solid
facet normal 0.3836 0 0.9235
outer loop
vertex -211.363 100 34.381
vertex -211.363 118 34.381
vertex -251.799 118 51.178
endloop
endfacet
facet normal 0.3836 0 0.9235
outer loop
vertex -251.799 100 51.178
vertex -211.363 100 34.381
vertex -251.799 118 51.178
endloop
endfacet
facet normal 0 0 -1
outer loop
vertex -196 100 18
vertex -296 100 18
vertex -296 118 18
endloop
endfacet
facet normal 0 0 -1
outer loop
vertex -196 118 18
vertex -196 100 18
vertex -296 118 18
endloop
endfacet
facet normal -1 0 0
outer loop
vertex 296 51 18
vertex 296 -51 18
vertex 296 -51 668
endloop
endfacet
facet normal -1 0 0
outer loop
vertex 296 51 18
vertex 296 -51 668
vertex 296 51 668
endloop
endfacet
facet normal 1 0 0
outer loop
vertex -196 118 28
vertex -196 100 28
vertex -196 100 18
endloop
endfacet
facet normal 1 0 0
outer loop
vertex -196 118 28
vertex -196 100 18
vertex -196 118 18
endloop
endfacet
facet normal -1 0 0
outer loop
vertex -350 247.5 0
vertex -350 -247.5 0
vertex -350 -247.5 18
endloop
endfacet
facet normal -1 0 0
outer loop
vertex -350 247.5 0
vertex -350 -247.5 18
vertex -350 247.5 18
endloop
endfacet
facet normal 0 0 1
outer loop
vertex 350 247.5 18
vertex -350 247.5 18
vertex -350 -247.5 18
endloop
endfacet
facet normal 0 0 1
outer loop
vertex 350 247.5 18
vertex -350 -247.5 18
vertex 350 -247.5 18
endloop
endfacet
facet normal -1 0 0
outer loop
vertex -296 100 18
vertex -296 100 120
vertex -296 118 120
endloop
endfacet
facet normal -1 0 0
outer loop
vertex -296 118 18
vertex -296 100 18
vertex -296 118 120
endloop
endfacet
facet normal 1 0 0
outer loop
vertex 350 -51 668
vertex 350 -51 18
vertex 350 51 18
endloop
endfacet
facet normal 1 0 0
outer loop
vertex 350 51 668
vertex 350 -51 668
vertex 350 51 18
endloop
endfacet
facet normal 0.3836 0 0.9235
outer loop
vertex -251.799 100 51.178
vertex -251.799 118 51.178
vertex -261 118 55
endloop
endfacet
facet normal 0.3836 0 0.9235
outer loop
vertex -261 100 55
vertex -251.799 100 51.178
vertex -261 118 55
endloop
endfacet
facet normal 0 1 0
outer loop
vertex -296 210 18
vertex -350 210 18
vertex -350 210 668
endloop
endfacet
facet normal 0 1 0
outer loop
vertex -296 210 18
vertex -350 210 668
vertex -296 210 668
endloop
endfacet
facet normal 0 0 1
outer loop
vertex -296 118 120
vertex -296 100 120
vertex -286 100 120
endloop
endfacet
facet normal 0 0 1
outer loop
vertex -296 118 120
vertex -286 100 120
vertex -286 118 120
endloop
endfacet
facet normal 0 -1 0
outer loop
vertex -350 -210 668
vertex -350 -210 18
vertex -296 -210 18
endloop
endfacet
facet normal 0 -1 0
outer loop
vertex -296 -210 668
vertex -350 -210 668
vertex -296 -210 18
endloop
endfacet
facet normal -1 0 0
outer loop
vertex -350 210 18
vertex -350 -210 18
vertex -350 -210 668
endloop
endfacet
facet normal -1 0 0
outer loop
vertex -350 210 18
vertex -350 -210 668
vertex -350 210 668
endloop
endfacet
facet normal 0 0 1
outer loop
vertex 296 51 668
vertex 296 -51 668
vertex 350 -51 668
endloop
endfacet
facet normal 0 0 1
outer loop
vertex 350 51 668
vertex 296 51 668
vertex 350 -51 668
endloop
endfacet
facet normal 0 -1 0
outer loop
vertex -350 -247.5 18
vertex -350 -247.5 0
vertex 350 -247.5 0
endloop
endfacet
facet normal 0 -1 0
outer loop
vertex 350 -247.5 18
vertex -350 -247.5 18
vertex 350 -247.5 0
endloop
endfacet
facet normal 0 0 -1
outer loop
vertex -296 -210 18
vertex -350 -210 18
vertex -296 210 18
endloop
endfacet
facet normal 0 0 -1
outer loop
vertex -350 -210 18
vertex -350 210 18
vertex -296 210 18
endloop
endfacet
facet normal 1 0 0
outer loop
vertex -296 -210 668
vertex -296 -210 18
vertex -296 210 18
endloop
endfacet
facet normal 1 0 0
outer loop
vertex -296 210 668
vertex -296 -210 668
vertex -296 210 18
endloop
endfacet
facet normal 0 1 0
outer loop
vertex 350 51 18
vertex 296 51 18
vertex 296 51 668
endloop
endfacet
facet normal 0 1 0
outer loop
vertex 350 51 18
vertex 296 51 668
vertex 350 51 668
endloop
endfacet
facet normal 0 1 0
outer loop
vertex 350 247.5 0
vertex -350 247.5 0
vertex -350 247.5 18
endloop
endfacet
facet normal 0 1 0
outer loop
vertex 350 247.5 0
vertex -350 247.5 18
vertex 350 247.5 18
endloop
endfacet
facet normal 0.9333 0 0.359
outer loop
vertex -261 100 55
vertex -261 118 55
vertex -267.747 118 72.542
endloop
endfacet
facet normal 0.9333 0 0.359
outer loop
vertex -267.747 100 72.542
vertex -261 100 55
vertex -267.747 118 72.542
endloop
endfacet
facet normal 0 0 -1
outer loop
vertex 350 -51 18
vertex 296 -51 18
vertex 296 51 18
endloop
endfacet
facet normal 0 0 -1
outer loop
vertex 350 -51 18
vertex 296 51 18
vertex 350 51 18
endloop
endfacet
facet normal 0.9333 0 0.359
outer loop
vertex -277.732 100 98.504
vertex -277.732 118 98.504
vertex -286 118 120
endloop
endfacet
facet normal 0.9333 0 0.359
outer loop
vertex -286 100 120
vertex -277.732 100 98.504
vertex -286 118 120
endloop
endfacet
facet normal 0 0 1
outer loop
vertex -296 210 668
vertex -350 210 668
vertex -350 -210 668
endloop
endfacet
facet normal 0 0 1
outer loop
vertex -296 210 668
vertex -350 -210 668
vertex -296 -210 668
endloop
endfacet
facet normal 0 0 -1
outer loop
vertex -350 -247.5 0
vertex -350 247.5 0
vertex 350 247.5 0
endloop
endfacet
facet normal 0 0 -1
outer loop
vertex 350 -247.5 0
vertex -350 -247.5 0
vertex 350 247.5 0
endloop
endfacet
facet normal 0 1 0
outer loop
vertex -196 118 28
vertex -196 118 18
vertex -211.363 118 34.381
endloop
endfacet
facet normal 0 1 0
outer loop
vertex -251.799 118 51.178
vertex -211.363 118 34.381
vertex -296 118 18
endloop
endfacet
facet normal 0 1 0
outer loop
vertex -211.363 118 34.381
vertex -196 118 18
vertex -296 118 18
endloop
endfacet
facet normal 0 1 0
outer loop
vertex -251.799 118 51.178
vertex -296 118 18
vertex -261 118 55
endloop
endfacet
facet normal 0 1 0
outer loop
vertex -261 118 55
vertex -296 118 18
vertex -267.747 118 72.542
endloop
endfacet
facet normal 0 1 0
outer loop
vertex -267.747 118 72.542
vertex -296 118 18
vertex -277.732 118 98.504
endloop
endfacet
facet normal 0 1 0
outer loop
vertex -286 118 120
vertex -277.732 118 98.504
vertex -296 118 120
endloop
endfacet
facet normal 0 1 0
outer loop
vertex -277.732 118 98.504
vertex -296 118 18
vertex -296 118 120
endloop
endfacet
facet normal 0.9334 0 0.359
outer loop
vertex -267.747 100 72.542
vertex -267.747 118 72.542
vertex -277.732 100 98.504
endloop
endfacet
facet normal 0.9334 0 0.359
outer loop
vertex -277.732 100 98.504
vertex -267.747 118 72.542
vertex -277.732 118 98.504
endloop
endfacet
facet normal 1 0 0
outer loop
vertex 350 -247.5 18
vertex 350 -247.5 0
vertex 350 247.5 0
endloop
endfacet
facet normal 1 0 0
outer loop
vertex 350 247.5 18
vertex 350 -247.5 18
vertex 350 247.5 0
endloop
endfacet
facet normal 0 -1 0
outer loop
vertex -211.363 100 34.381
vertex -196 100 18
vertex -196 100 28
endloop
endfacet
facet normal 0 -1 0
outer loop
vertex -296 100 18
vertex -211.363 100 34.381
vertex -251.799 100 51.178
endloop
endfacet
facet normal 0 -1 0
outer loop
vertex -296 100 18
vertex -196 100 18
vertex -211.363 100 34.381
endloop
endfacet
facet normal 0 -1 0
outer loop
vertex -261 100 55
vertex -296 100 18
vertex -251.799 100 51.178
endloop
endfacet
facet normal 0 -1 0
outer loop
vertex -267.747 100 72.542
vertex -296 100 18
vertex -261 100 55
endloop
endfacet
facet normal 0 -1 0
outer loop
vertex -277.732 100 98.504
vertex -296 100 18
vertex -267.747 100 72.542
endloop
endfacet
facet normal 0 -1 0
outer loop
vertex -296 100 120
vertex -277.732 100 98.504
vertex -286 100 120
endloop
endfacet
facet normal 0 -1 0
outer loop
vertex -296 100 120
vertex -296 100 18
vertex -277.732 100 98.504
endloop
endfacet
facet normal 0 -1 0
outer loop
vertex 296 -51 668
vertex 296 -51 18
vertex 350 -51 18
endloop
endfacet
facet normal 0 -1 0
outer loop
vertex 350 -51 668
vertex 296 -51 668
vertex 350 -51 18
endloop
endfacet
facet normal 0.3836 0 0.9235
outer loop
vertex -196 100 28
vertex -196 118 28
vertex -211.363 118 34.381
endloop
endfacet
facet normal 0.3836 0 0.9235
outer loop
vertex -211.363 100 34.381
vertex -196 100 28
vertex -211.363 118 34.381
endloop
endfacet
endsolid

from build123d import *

# Parameters (mm, degrees)
F0_W      = 700
F0_H      = 495
F1_DEPTH  = 18
F2_W      = 54
F2_H      = 420
F3_DEPTH  = 650
F2_H_2    = 102
F4_W      = 102
F4_H      = 650
F5_DEPTH  = 700.001
F6_W      = 18
F6_H      = 102
F7_DEPTH  = 100
F8_DEPTH  = 650
F10_DEPTH = 25


# Not quite as in the source:
# - a feature names something its author has since deleted; it is built from what else it names


with BuildPart() as f1:
    # F0 (on Top) → F1 (new body)
    with BuildSketch(Plane.XY):
        Rectangle(F0_W, F0_H)
    extrude(amount=F1_DEPTH)


with BuildPart() as f3:
    # F2 (on face) → F3 (new body)
    with BuildSketch(Plane.XY.offset(18)):
        with Locations((-323, 0)):
            Rectangle(F2_W, F2_H)
    extrude(amount=F3_DEPTH)


with BuildPart() as f3b:
    # F2 (on face) → F3, piece 2 (new body)
    with BuildSketch(Plane.XY.offset(18)):
        with Locations((323, 0)):
            Rectangle(F2_W, F2_H_2)
    extrude(amount=F3_DEPTH)


with BuildPart() as f5_tool:
    # F4 (on face) → F5 (new body, through all)
    with BuildSketch(Plane.YZ.offset(350)):
        with Locations((0, 343)):
            Rectangle(F4_W, F4_H)
    extrude(amount=-F5_DEPTH)


with BuildPart() as f3_1:
    add(f3.part)

    # F5: cut by f5_tool
    add(f5_tool.part, mode=Mode.SUBTRACT)

    # F2 (on face) → F8 (join)
    with BuildSketch(Plane.XY.offset(18)):
        with Locations((-323, 0)):
            Rectangle(F2_W, F2_H)
    extrude(amount=F8_DEPTH)


with BuildPart() as f3b_1:
    add(f3b.part)

    # F5: cut by f5_tool
    add(f5_tool.part, mode=Mode.SUBTRACT)


with BuildPart() as f7:
    # F6 (on face) → F7 (new body)
    with BuildSketch(Plane.YZ.offset(-296)):
        with Locations((109, 69)):
            Rectangle(F6_W, F6_H)
    extrude(amount=F7_DEPTH)

    # F9 (on face) → F10 (cut)
    with BuildSketch(Plane(origin=(0, 118, 0), x_dir=(-1, 0, 0), z_dir=(0, 1, 0))):
        Polygon((261, 55), (267.7467766581, 72.5416193109), (277.7322773327, 98.5039210651), (286, 120), (251, 120), (196, 120), (196, 28), (211.3627376398, 34.3814448658), (251.799326006, 51.1781815717), align=None)
    extrude(amount=-F10_DEPTH, mode=Mode.SUBTRACT)


with BuildPart() as f8:
    # F2 (on face) → F8, piece 2 (new body)
    with BuildSketch(Plane.XY.offset(18)):
        with Locations((323, 0)):
            Rectangle(F2_W, F2_H_2)
    extrude(amount=F8_DEPTH)


solid = Compound([f1.part, f3_1.part, f7.part, f8.part])
